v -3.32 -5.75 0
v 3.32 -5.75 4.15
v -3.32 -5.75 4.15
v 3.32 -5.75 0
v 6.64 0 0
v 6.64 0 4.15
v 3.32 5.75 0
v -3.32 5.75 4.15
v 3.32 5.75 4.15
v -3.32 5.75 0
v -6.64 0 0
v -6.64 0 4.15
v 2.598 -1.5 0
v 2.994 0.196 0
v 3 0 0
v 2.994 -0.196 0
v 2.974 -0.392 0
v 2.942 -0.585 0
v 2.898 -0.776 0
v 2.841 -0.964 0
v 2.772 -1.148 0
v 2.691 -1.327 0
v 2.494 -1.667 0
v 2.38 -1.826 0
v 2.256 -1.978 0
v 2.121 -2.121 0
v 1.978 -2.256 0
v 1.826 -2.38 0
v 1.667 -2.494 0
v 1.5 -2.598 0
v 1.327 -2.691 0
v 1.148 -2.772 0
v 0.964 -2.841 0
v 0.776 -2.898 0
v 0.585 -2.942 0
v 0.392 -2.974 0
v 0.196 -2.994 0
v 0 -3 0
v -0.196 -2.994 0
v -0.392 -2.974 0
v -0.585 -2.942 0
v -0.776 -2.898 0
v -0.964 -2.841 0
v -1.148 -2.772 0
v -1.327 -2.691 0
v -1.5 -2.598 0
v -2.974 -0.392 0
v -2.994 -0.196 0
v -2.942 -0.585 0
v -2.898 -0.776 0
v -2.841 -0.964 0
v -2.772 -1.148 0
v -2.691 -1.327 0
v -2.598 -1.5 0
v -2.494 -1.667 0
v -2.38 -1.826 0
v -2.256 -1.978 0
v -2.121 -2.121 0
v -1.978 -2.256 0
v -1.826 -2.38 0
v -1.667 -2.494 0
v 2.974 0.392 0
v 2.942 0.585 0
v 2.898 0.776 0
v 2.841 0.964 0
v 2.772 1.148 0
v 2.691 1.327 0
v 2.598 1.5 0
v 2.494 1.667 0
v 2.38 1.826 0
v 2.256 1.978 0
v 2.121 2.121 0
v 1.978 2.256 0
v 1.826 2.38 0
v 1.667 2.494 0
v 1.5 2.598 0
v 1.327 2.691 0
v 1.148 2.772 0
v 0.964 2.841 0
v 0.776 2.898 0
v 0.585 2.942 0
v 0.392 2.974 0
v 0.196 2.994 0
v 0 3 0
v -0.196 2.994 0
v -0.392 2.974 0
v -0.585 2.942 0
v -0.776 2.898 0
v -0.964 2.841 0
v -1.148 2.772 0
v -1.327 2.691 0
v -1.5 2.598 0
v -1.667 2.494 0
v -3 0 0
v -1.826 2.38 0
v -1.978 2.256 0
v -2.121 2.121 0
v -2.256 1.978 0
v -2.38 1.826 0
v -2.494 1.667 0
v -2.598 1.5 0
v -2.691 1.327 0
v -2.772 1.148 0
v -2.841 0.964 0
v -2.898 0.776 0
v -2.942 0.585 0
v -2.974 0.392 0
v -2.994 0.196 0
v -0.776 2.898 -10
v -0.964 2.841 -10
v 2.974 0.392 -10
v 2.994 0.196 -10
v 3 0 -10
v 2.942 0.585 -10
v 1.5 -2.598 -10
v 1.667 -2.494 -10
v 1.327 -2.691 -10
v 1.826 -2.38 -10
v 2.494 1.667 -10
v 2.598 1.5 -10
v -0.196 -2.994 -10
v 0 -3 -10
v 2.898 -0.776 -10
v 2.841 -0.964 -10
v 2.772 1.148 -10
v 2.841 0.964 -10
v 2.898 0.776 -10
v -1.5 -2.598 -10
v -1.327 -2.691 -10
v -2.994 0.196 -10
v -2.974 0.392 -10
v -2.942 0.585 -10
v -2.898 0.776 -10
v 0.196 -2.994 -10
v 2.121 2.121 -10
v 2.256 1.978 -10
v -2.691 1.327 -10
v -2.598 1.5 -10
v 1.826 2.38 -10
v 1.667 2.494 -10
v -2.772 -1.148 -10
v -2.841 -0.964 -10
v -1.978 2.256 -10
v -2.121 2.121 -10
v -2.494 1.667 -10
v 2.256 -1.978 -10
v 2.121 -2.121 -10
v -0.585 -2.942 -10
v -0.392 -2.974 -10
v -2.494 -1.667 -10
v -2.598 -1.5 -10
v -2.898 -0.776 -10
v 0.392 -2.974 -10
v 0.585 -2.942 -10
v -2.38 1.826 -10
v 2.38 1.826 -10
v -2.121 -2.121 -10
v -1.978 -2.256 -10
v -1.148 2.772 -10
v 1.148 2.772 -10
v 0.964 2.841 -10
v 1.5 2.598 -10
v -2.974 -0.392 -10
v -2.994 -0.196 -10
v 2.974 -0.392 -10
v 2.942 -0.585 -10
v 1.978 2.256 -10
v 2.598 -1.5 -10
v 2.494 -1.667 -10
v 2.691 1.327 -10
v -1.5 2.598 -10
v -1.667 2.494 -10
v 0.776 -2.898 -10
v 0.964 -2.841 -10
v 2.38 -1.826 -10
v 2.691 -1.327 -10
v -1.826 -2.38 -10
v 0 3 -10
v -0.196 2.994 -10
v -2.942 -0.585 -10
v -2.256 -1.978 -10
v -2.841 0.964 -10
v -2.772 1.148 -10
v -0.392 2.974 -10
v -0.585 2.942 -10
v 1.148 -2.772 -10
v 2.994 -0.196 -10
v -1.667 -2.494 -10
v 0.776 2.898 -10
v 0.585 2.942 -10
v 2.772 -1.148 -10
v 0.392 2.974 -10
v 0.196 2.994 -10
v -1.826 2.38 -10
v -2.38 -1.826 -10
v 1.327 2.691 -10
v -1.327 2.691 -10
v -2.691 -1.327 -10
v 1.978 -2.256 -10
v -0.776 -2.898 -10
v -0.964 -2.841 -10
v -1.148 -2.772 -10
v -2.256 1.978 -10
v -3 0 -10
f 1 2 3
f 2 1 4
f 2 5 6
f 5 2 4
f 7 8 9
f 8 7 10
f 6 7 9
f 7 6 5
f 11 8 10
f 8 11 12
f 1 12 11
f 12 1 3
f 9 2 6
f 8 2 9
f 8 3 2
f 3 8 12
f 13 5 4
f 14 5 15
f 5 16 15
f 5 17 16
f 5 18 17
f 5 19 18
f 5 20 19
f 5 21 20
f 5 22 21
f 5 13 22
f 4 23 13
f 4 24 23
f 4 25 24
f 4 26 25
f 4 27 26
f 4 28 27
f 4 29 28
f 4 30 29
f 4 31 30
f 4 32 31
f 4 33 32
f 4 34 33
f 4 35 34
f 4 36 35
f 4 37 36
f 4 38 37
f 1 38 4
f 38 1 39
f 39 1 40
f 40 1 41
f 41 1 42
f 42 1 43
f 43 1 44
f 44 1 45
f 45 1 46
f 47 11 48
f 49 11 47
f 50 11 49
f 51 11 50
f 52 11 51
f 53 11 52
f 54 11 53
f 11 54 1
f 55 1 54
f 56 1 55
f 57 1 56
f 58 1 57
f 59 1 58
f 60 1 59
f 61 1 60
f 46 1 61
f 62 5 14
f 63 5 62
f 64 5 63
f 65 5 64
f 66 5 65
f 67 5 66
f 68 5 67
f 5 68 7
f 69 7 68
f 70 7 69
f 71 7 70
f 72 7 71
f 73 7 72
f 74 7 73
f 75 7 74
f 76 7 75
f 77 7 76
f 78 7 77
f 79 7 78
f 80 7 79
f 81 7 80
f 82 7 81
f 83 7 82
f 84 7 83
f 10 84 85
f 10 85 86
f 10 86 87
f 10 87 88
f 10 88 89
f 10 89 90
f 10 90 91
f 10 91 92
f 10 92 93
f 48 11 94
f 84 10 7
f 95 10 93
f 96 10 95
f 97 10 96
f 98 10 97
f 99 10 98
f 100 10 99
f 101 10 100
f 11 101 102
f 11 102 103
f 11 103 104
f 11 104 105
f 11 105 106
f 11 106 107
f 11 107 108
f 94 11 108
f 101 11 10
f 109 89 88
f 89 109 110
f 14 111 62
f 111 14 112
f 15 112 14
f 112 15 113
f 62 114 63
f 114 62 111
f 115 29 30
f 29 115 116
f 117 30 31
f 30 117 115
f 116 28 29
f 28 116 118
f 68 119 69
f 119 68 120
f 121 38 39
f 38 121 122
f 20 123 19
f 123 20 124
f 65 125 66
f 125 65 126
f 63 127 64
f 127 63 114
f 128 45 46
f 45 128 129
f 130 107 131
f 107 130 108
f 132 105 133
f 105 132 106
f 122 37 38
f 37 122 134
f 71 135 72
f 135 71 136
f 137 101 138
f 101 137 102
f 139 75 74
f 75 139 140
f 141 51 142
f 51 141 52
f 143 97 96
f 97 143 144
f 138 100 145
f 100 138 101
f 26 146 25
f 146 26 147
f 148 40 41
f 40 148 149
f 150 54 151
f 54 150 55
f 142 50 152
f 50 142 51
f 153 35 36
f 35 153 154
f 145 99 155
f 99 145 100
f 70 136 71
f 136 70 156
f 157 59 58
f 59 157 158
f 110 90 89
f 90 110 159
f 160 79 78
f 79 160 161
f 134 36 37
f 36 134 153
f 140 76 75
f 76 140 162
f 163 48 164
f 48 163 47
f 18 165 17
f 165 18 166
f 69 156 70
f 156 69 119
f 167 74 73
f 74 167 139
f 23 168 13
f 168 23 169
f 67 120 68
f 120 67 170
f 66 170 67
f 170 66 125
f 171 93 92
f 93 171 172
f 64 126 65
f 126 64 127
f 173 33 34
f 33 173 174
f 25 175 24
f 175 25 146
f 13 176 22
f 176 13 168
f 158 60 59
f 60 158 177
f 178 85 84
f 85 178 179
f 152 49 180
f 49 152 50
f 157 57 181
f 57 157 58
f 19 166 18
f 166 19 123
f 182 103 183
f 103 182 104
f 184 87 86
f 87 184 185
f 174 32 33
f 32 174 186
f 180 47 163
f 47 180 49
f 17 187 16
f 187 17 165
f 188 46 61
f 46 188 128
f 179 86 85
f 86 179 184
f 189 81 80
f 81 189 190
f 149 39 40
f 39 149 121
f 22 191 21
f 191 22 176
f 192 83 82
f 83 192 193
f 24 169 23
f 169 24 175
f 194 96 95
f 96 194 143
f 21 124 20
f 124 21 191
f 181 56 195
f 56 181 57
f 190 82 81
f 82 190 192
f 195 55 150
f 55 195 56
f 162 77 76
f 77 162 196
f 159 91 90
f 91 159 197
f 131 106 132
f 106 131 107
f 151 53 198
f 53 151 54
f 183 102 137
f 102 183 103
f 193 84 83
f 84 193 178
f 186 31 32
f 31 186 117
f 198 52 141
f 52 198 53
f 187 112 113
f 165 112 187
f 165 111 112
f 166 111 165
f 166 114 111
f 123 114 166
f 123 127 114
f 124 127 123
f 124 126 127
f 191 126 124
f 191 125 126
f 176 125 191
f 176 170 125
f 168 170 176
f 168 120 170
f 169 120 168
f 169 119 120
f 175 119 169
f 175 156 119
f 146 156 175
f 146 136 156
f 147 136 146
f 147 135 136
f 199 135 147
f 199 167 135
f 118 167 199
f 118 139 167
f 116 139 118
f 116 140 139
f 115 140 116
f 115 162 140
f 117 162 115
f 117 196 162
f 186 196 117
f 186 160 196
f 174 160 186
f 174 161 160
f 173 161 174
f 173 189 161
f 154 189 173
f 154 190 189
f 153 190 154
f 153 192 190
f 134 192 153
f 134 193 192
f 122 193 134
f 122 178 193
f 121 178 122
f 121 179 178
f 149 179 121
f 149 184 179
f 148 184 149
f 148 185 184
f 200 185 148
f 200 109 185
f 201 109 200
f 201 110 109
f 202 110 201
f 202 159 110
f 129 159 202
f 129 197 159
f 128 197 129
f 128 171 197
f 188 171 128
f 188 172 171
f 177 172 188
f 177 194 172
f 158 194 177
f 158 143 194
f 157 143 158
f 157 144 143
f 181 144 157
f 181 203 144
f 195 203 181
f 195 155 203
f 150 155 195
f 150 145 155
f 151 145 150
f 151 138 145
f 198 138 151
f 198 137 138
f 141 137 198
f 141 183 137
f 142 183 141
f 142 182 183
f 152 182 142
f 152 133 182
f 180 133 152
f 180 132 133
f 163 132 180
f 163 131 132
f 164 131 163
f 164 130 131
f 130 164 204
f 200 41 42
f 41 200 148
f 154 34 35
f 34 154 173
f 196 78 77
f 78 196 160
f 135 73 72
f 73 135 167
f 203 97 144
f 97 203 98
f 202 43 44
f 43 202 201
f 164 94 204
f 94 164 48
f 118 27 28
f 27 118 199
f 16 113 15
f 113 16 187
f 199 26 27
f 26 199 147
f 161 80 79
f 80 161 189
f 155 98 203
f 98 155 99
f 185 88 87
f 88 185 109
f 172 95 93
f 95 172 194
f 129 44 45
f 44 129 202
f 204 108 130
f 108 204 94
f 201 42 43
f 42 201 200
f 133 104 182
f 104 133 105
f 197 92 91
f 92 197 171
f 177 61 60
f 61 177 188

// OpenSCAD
// Hex head screw (single connected solid)
// Target: 6.0mm shaft diameter, 11.5mm hex head diameter (across flats), head height 4.15mm, 10mm length under head

shaft_diameter_mm      = 6.0;
length_under_head_mm   = 10.0;
head_diameter_mm       = 11.5;   // across flats (use $fn=6)
head_height_mm         = 4.15;

thread_major_diameter_mm = 6.0;  // keep at nominal so dimensions match
thread_length_mm         = 10.0; // represent full under-head length as threaded

tip_length_mm = 1.0;             // small chamfered/pointed tip detail
overlap_mm    = 0.2;

$fn = 96;

module hex_prism_af(af, h, center=false) {
    // For cylinder($fn=6), r is circumradius; across-flats = 2*r*cos(30)
    r = af / (2 * cos(30));
    cylinder(h=h, r=r, $fn=6, center=center);
}

module hex_head_screw() {
    shank_r = shaft_diameter_mm/2;
    thread_r = thread_major_diameter_mm/2;

    // Z reference: underside of head at z=0, head extends +Z, shaft extends -Z
    union() {
        // Hex head
        translate([0, 0, head_height_mm/2])
            hex_prism_af(head_diameter_mm, head_height_mm, center=true);

        // Under-head shaft (thread major diameter representation)
        translate([0, 0, -length_under_head_mm/2 + overlap_mm/2])
            cylinder(h=length_under_head_mm + overlap_mm, r=thread_r, center=true);

        // Tip detail: conical/chamfered end, connected to shaft
        translate([0, 0, -length_under_head_mm + tip_length_mm/2 + overlap_mm/2])
            cylinder(h=tip_length_mm + overlap_mm, r1=thread_r, r2=max(0.01, thread_r*0.15), center=true);
    }
}

hex_head_screw();
